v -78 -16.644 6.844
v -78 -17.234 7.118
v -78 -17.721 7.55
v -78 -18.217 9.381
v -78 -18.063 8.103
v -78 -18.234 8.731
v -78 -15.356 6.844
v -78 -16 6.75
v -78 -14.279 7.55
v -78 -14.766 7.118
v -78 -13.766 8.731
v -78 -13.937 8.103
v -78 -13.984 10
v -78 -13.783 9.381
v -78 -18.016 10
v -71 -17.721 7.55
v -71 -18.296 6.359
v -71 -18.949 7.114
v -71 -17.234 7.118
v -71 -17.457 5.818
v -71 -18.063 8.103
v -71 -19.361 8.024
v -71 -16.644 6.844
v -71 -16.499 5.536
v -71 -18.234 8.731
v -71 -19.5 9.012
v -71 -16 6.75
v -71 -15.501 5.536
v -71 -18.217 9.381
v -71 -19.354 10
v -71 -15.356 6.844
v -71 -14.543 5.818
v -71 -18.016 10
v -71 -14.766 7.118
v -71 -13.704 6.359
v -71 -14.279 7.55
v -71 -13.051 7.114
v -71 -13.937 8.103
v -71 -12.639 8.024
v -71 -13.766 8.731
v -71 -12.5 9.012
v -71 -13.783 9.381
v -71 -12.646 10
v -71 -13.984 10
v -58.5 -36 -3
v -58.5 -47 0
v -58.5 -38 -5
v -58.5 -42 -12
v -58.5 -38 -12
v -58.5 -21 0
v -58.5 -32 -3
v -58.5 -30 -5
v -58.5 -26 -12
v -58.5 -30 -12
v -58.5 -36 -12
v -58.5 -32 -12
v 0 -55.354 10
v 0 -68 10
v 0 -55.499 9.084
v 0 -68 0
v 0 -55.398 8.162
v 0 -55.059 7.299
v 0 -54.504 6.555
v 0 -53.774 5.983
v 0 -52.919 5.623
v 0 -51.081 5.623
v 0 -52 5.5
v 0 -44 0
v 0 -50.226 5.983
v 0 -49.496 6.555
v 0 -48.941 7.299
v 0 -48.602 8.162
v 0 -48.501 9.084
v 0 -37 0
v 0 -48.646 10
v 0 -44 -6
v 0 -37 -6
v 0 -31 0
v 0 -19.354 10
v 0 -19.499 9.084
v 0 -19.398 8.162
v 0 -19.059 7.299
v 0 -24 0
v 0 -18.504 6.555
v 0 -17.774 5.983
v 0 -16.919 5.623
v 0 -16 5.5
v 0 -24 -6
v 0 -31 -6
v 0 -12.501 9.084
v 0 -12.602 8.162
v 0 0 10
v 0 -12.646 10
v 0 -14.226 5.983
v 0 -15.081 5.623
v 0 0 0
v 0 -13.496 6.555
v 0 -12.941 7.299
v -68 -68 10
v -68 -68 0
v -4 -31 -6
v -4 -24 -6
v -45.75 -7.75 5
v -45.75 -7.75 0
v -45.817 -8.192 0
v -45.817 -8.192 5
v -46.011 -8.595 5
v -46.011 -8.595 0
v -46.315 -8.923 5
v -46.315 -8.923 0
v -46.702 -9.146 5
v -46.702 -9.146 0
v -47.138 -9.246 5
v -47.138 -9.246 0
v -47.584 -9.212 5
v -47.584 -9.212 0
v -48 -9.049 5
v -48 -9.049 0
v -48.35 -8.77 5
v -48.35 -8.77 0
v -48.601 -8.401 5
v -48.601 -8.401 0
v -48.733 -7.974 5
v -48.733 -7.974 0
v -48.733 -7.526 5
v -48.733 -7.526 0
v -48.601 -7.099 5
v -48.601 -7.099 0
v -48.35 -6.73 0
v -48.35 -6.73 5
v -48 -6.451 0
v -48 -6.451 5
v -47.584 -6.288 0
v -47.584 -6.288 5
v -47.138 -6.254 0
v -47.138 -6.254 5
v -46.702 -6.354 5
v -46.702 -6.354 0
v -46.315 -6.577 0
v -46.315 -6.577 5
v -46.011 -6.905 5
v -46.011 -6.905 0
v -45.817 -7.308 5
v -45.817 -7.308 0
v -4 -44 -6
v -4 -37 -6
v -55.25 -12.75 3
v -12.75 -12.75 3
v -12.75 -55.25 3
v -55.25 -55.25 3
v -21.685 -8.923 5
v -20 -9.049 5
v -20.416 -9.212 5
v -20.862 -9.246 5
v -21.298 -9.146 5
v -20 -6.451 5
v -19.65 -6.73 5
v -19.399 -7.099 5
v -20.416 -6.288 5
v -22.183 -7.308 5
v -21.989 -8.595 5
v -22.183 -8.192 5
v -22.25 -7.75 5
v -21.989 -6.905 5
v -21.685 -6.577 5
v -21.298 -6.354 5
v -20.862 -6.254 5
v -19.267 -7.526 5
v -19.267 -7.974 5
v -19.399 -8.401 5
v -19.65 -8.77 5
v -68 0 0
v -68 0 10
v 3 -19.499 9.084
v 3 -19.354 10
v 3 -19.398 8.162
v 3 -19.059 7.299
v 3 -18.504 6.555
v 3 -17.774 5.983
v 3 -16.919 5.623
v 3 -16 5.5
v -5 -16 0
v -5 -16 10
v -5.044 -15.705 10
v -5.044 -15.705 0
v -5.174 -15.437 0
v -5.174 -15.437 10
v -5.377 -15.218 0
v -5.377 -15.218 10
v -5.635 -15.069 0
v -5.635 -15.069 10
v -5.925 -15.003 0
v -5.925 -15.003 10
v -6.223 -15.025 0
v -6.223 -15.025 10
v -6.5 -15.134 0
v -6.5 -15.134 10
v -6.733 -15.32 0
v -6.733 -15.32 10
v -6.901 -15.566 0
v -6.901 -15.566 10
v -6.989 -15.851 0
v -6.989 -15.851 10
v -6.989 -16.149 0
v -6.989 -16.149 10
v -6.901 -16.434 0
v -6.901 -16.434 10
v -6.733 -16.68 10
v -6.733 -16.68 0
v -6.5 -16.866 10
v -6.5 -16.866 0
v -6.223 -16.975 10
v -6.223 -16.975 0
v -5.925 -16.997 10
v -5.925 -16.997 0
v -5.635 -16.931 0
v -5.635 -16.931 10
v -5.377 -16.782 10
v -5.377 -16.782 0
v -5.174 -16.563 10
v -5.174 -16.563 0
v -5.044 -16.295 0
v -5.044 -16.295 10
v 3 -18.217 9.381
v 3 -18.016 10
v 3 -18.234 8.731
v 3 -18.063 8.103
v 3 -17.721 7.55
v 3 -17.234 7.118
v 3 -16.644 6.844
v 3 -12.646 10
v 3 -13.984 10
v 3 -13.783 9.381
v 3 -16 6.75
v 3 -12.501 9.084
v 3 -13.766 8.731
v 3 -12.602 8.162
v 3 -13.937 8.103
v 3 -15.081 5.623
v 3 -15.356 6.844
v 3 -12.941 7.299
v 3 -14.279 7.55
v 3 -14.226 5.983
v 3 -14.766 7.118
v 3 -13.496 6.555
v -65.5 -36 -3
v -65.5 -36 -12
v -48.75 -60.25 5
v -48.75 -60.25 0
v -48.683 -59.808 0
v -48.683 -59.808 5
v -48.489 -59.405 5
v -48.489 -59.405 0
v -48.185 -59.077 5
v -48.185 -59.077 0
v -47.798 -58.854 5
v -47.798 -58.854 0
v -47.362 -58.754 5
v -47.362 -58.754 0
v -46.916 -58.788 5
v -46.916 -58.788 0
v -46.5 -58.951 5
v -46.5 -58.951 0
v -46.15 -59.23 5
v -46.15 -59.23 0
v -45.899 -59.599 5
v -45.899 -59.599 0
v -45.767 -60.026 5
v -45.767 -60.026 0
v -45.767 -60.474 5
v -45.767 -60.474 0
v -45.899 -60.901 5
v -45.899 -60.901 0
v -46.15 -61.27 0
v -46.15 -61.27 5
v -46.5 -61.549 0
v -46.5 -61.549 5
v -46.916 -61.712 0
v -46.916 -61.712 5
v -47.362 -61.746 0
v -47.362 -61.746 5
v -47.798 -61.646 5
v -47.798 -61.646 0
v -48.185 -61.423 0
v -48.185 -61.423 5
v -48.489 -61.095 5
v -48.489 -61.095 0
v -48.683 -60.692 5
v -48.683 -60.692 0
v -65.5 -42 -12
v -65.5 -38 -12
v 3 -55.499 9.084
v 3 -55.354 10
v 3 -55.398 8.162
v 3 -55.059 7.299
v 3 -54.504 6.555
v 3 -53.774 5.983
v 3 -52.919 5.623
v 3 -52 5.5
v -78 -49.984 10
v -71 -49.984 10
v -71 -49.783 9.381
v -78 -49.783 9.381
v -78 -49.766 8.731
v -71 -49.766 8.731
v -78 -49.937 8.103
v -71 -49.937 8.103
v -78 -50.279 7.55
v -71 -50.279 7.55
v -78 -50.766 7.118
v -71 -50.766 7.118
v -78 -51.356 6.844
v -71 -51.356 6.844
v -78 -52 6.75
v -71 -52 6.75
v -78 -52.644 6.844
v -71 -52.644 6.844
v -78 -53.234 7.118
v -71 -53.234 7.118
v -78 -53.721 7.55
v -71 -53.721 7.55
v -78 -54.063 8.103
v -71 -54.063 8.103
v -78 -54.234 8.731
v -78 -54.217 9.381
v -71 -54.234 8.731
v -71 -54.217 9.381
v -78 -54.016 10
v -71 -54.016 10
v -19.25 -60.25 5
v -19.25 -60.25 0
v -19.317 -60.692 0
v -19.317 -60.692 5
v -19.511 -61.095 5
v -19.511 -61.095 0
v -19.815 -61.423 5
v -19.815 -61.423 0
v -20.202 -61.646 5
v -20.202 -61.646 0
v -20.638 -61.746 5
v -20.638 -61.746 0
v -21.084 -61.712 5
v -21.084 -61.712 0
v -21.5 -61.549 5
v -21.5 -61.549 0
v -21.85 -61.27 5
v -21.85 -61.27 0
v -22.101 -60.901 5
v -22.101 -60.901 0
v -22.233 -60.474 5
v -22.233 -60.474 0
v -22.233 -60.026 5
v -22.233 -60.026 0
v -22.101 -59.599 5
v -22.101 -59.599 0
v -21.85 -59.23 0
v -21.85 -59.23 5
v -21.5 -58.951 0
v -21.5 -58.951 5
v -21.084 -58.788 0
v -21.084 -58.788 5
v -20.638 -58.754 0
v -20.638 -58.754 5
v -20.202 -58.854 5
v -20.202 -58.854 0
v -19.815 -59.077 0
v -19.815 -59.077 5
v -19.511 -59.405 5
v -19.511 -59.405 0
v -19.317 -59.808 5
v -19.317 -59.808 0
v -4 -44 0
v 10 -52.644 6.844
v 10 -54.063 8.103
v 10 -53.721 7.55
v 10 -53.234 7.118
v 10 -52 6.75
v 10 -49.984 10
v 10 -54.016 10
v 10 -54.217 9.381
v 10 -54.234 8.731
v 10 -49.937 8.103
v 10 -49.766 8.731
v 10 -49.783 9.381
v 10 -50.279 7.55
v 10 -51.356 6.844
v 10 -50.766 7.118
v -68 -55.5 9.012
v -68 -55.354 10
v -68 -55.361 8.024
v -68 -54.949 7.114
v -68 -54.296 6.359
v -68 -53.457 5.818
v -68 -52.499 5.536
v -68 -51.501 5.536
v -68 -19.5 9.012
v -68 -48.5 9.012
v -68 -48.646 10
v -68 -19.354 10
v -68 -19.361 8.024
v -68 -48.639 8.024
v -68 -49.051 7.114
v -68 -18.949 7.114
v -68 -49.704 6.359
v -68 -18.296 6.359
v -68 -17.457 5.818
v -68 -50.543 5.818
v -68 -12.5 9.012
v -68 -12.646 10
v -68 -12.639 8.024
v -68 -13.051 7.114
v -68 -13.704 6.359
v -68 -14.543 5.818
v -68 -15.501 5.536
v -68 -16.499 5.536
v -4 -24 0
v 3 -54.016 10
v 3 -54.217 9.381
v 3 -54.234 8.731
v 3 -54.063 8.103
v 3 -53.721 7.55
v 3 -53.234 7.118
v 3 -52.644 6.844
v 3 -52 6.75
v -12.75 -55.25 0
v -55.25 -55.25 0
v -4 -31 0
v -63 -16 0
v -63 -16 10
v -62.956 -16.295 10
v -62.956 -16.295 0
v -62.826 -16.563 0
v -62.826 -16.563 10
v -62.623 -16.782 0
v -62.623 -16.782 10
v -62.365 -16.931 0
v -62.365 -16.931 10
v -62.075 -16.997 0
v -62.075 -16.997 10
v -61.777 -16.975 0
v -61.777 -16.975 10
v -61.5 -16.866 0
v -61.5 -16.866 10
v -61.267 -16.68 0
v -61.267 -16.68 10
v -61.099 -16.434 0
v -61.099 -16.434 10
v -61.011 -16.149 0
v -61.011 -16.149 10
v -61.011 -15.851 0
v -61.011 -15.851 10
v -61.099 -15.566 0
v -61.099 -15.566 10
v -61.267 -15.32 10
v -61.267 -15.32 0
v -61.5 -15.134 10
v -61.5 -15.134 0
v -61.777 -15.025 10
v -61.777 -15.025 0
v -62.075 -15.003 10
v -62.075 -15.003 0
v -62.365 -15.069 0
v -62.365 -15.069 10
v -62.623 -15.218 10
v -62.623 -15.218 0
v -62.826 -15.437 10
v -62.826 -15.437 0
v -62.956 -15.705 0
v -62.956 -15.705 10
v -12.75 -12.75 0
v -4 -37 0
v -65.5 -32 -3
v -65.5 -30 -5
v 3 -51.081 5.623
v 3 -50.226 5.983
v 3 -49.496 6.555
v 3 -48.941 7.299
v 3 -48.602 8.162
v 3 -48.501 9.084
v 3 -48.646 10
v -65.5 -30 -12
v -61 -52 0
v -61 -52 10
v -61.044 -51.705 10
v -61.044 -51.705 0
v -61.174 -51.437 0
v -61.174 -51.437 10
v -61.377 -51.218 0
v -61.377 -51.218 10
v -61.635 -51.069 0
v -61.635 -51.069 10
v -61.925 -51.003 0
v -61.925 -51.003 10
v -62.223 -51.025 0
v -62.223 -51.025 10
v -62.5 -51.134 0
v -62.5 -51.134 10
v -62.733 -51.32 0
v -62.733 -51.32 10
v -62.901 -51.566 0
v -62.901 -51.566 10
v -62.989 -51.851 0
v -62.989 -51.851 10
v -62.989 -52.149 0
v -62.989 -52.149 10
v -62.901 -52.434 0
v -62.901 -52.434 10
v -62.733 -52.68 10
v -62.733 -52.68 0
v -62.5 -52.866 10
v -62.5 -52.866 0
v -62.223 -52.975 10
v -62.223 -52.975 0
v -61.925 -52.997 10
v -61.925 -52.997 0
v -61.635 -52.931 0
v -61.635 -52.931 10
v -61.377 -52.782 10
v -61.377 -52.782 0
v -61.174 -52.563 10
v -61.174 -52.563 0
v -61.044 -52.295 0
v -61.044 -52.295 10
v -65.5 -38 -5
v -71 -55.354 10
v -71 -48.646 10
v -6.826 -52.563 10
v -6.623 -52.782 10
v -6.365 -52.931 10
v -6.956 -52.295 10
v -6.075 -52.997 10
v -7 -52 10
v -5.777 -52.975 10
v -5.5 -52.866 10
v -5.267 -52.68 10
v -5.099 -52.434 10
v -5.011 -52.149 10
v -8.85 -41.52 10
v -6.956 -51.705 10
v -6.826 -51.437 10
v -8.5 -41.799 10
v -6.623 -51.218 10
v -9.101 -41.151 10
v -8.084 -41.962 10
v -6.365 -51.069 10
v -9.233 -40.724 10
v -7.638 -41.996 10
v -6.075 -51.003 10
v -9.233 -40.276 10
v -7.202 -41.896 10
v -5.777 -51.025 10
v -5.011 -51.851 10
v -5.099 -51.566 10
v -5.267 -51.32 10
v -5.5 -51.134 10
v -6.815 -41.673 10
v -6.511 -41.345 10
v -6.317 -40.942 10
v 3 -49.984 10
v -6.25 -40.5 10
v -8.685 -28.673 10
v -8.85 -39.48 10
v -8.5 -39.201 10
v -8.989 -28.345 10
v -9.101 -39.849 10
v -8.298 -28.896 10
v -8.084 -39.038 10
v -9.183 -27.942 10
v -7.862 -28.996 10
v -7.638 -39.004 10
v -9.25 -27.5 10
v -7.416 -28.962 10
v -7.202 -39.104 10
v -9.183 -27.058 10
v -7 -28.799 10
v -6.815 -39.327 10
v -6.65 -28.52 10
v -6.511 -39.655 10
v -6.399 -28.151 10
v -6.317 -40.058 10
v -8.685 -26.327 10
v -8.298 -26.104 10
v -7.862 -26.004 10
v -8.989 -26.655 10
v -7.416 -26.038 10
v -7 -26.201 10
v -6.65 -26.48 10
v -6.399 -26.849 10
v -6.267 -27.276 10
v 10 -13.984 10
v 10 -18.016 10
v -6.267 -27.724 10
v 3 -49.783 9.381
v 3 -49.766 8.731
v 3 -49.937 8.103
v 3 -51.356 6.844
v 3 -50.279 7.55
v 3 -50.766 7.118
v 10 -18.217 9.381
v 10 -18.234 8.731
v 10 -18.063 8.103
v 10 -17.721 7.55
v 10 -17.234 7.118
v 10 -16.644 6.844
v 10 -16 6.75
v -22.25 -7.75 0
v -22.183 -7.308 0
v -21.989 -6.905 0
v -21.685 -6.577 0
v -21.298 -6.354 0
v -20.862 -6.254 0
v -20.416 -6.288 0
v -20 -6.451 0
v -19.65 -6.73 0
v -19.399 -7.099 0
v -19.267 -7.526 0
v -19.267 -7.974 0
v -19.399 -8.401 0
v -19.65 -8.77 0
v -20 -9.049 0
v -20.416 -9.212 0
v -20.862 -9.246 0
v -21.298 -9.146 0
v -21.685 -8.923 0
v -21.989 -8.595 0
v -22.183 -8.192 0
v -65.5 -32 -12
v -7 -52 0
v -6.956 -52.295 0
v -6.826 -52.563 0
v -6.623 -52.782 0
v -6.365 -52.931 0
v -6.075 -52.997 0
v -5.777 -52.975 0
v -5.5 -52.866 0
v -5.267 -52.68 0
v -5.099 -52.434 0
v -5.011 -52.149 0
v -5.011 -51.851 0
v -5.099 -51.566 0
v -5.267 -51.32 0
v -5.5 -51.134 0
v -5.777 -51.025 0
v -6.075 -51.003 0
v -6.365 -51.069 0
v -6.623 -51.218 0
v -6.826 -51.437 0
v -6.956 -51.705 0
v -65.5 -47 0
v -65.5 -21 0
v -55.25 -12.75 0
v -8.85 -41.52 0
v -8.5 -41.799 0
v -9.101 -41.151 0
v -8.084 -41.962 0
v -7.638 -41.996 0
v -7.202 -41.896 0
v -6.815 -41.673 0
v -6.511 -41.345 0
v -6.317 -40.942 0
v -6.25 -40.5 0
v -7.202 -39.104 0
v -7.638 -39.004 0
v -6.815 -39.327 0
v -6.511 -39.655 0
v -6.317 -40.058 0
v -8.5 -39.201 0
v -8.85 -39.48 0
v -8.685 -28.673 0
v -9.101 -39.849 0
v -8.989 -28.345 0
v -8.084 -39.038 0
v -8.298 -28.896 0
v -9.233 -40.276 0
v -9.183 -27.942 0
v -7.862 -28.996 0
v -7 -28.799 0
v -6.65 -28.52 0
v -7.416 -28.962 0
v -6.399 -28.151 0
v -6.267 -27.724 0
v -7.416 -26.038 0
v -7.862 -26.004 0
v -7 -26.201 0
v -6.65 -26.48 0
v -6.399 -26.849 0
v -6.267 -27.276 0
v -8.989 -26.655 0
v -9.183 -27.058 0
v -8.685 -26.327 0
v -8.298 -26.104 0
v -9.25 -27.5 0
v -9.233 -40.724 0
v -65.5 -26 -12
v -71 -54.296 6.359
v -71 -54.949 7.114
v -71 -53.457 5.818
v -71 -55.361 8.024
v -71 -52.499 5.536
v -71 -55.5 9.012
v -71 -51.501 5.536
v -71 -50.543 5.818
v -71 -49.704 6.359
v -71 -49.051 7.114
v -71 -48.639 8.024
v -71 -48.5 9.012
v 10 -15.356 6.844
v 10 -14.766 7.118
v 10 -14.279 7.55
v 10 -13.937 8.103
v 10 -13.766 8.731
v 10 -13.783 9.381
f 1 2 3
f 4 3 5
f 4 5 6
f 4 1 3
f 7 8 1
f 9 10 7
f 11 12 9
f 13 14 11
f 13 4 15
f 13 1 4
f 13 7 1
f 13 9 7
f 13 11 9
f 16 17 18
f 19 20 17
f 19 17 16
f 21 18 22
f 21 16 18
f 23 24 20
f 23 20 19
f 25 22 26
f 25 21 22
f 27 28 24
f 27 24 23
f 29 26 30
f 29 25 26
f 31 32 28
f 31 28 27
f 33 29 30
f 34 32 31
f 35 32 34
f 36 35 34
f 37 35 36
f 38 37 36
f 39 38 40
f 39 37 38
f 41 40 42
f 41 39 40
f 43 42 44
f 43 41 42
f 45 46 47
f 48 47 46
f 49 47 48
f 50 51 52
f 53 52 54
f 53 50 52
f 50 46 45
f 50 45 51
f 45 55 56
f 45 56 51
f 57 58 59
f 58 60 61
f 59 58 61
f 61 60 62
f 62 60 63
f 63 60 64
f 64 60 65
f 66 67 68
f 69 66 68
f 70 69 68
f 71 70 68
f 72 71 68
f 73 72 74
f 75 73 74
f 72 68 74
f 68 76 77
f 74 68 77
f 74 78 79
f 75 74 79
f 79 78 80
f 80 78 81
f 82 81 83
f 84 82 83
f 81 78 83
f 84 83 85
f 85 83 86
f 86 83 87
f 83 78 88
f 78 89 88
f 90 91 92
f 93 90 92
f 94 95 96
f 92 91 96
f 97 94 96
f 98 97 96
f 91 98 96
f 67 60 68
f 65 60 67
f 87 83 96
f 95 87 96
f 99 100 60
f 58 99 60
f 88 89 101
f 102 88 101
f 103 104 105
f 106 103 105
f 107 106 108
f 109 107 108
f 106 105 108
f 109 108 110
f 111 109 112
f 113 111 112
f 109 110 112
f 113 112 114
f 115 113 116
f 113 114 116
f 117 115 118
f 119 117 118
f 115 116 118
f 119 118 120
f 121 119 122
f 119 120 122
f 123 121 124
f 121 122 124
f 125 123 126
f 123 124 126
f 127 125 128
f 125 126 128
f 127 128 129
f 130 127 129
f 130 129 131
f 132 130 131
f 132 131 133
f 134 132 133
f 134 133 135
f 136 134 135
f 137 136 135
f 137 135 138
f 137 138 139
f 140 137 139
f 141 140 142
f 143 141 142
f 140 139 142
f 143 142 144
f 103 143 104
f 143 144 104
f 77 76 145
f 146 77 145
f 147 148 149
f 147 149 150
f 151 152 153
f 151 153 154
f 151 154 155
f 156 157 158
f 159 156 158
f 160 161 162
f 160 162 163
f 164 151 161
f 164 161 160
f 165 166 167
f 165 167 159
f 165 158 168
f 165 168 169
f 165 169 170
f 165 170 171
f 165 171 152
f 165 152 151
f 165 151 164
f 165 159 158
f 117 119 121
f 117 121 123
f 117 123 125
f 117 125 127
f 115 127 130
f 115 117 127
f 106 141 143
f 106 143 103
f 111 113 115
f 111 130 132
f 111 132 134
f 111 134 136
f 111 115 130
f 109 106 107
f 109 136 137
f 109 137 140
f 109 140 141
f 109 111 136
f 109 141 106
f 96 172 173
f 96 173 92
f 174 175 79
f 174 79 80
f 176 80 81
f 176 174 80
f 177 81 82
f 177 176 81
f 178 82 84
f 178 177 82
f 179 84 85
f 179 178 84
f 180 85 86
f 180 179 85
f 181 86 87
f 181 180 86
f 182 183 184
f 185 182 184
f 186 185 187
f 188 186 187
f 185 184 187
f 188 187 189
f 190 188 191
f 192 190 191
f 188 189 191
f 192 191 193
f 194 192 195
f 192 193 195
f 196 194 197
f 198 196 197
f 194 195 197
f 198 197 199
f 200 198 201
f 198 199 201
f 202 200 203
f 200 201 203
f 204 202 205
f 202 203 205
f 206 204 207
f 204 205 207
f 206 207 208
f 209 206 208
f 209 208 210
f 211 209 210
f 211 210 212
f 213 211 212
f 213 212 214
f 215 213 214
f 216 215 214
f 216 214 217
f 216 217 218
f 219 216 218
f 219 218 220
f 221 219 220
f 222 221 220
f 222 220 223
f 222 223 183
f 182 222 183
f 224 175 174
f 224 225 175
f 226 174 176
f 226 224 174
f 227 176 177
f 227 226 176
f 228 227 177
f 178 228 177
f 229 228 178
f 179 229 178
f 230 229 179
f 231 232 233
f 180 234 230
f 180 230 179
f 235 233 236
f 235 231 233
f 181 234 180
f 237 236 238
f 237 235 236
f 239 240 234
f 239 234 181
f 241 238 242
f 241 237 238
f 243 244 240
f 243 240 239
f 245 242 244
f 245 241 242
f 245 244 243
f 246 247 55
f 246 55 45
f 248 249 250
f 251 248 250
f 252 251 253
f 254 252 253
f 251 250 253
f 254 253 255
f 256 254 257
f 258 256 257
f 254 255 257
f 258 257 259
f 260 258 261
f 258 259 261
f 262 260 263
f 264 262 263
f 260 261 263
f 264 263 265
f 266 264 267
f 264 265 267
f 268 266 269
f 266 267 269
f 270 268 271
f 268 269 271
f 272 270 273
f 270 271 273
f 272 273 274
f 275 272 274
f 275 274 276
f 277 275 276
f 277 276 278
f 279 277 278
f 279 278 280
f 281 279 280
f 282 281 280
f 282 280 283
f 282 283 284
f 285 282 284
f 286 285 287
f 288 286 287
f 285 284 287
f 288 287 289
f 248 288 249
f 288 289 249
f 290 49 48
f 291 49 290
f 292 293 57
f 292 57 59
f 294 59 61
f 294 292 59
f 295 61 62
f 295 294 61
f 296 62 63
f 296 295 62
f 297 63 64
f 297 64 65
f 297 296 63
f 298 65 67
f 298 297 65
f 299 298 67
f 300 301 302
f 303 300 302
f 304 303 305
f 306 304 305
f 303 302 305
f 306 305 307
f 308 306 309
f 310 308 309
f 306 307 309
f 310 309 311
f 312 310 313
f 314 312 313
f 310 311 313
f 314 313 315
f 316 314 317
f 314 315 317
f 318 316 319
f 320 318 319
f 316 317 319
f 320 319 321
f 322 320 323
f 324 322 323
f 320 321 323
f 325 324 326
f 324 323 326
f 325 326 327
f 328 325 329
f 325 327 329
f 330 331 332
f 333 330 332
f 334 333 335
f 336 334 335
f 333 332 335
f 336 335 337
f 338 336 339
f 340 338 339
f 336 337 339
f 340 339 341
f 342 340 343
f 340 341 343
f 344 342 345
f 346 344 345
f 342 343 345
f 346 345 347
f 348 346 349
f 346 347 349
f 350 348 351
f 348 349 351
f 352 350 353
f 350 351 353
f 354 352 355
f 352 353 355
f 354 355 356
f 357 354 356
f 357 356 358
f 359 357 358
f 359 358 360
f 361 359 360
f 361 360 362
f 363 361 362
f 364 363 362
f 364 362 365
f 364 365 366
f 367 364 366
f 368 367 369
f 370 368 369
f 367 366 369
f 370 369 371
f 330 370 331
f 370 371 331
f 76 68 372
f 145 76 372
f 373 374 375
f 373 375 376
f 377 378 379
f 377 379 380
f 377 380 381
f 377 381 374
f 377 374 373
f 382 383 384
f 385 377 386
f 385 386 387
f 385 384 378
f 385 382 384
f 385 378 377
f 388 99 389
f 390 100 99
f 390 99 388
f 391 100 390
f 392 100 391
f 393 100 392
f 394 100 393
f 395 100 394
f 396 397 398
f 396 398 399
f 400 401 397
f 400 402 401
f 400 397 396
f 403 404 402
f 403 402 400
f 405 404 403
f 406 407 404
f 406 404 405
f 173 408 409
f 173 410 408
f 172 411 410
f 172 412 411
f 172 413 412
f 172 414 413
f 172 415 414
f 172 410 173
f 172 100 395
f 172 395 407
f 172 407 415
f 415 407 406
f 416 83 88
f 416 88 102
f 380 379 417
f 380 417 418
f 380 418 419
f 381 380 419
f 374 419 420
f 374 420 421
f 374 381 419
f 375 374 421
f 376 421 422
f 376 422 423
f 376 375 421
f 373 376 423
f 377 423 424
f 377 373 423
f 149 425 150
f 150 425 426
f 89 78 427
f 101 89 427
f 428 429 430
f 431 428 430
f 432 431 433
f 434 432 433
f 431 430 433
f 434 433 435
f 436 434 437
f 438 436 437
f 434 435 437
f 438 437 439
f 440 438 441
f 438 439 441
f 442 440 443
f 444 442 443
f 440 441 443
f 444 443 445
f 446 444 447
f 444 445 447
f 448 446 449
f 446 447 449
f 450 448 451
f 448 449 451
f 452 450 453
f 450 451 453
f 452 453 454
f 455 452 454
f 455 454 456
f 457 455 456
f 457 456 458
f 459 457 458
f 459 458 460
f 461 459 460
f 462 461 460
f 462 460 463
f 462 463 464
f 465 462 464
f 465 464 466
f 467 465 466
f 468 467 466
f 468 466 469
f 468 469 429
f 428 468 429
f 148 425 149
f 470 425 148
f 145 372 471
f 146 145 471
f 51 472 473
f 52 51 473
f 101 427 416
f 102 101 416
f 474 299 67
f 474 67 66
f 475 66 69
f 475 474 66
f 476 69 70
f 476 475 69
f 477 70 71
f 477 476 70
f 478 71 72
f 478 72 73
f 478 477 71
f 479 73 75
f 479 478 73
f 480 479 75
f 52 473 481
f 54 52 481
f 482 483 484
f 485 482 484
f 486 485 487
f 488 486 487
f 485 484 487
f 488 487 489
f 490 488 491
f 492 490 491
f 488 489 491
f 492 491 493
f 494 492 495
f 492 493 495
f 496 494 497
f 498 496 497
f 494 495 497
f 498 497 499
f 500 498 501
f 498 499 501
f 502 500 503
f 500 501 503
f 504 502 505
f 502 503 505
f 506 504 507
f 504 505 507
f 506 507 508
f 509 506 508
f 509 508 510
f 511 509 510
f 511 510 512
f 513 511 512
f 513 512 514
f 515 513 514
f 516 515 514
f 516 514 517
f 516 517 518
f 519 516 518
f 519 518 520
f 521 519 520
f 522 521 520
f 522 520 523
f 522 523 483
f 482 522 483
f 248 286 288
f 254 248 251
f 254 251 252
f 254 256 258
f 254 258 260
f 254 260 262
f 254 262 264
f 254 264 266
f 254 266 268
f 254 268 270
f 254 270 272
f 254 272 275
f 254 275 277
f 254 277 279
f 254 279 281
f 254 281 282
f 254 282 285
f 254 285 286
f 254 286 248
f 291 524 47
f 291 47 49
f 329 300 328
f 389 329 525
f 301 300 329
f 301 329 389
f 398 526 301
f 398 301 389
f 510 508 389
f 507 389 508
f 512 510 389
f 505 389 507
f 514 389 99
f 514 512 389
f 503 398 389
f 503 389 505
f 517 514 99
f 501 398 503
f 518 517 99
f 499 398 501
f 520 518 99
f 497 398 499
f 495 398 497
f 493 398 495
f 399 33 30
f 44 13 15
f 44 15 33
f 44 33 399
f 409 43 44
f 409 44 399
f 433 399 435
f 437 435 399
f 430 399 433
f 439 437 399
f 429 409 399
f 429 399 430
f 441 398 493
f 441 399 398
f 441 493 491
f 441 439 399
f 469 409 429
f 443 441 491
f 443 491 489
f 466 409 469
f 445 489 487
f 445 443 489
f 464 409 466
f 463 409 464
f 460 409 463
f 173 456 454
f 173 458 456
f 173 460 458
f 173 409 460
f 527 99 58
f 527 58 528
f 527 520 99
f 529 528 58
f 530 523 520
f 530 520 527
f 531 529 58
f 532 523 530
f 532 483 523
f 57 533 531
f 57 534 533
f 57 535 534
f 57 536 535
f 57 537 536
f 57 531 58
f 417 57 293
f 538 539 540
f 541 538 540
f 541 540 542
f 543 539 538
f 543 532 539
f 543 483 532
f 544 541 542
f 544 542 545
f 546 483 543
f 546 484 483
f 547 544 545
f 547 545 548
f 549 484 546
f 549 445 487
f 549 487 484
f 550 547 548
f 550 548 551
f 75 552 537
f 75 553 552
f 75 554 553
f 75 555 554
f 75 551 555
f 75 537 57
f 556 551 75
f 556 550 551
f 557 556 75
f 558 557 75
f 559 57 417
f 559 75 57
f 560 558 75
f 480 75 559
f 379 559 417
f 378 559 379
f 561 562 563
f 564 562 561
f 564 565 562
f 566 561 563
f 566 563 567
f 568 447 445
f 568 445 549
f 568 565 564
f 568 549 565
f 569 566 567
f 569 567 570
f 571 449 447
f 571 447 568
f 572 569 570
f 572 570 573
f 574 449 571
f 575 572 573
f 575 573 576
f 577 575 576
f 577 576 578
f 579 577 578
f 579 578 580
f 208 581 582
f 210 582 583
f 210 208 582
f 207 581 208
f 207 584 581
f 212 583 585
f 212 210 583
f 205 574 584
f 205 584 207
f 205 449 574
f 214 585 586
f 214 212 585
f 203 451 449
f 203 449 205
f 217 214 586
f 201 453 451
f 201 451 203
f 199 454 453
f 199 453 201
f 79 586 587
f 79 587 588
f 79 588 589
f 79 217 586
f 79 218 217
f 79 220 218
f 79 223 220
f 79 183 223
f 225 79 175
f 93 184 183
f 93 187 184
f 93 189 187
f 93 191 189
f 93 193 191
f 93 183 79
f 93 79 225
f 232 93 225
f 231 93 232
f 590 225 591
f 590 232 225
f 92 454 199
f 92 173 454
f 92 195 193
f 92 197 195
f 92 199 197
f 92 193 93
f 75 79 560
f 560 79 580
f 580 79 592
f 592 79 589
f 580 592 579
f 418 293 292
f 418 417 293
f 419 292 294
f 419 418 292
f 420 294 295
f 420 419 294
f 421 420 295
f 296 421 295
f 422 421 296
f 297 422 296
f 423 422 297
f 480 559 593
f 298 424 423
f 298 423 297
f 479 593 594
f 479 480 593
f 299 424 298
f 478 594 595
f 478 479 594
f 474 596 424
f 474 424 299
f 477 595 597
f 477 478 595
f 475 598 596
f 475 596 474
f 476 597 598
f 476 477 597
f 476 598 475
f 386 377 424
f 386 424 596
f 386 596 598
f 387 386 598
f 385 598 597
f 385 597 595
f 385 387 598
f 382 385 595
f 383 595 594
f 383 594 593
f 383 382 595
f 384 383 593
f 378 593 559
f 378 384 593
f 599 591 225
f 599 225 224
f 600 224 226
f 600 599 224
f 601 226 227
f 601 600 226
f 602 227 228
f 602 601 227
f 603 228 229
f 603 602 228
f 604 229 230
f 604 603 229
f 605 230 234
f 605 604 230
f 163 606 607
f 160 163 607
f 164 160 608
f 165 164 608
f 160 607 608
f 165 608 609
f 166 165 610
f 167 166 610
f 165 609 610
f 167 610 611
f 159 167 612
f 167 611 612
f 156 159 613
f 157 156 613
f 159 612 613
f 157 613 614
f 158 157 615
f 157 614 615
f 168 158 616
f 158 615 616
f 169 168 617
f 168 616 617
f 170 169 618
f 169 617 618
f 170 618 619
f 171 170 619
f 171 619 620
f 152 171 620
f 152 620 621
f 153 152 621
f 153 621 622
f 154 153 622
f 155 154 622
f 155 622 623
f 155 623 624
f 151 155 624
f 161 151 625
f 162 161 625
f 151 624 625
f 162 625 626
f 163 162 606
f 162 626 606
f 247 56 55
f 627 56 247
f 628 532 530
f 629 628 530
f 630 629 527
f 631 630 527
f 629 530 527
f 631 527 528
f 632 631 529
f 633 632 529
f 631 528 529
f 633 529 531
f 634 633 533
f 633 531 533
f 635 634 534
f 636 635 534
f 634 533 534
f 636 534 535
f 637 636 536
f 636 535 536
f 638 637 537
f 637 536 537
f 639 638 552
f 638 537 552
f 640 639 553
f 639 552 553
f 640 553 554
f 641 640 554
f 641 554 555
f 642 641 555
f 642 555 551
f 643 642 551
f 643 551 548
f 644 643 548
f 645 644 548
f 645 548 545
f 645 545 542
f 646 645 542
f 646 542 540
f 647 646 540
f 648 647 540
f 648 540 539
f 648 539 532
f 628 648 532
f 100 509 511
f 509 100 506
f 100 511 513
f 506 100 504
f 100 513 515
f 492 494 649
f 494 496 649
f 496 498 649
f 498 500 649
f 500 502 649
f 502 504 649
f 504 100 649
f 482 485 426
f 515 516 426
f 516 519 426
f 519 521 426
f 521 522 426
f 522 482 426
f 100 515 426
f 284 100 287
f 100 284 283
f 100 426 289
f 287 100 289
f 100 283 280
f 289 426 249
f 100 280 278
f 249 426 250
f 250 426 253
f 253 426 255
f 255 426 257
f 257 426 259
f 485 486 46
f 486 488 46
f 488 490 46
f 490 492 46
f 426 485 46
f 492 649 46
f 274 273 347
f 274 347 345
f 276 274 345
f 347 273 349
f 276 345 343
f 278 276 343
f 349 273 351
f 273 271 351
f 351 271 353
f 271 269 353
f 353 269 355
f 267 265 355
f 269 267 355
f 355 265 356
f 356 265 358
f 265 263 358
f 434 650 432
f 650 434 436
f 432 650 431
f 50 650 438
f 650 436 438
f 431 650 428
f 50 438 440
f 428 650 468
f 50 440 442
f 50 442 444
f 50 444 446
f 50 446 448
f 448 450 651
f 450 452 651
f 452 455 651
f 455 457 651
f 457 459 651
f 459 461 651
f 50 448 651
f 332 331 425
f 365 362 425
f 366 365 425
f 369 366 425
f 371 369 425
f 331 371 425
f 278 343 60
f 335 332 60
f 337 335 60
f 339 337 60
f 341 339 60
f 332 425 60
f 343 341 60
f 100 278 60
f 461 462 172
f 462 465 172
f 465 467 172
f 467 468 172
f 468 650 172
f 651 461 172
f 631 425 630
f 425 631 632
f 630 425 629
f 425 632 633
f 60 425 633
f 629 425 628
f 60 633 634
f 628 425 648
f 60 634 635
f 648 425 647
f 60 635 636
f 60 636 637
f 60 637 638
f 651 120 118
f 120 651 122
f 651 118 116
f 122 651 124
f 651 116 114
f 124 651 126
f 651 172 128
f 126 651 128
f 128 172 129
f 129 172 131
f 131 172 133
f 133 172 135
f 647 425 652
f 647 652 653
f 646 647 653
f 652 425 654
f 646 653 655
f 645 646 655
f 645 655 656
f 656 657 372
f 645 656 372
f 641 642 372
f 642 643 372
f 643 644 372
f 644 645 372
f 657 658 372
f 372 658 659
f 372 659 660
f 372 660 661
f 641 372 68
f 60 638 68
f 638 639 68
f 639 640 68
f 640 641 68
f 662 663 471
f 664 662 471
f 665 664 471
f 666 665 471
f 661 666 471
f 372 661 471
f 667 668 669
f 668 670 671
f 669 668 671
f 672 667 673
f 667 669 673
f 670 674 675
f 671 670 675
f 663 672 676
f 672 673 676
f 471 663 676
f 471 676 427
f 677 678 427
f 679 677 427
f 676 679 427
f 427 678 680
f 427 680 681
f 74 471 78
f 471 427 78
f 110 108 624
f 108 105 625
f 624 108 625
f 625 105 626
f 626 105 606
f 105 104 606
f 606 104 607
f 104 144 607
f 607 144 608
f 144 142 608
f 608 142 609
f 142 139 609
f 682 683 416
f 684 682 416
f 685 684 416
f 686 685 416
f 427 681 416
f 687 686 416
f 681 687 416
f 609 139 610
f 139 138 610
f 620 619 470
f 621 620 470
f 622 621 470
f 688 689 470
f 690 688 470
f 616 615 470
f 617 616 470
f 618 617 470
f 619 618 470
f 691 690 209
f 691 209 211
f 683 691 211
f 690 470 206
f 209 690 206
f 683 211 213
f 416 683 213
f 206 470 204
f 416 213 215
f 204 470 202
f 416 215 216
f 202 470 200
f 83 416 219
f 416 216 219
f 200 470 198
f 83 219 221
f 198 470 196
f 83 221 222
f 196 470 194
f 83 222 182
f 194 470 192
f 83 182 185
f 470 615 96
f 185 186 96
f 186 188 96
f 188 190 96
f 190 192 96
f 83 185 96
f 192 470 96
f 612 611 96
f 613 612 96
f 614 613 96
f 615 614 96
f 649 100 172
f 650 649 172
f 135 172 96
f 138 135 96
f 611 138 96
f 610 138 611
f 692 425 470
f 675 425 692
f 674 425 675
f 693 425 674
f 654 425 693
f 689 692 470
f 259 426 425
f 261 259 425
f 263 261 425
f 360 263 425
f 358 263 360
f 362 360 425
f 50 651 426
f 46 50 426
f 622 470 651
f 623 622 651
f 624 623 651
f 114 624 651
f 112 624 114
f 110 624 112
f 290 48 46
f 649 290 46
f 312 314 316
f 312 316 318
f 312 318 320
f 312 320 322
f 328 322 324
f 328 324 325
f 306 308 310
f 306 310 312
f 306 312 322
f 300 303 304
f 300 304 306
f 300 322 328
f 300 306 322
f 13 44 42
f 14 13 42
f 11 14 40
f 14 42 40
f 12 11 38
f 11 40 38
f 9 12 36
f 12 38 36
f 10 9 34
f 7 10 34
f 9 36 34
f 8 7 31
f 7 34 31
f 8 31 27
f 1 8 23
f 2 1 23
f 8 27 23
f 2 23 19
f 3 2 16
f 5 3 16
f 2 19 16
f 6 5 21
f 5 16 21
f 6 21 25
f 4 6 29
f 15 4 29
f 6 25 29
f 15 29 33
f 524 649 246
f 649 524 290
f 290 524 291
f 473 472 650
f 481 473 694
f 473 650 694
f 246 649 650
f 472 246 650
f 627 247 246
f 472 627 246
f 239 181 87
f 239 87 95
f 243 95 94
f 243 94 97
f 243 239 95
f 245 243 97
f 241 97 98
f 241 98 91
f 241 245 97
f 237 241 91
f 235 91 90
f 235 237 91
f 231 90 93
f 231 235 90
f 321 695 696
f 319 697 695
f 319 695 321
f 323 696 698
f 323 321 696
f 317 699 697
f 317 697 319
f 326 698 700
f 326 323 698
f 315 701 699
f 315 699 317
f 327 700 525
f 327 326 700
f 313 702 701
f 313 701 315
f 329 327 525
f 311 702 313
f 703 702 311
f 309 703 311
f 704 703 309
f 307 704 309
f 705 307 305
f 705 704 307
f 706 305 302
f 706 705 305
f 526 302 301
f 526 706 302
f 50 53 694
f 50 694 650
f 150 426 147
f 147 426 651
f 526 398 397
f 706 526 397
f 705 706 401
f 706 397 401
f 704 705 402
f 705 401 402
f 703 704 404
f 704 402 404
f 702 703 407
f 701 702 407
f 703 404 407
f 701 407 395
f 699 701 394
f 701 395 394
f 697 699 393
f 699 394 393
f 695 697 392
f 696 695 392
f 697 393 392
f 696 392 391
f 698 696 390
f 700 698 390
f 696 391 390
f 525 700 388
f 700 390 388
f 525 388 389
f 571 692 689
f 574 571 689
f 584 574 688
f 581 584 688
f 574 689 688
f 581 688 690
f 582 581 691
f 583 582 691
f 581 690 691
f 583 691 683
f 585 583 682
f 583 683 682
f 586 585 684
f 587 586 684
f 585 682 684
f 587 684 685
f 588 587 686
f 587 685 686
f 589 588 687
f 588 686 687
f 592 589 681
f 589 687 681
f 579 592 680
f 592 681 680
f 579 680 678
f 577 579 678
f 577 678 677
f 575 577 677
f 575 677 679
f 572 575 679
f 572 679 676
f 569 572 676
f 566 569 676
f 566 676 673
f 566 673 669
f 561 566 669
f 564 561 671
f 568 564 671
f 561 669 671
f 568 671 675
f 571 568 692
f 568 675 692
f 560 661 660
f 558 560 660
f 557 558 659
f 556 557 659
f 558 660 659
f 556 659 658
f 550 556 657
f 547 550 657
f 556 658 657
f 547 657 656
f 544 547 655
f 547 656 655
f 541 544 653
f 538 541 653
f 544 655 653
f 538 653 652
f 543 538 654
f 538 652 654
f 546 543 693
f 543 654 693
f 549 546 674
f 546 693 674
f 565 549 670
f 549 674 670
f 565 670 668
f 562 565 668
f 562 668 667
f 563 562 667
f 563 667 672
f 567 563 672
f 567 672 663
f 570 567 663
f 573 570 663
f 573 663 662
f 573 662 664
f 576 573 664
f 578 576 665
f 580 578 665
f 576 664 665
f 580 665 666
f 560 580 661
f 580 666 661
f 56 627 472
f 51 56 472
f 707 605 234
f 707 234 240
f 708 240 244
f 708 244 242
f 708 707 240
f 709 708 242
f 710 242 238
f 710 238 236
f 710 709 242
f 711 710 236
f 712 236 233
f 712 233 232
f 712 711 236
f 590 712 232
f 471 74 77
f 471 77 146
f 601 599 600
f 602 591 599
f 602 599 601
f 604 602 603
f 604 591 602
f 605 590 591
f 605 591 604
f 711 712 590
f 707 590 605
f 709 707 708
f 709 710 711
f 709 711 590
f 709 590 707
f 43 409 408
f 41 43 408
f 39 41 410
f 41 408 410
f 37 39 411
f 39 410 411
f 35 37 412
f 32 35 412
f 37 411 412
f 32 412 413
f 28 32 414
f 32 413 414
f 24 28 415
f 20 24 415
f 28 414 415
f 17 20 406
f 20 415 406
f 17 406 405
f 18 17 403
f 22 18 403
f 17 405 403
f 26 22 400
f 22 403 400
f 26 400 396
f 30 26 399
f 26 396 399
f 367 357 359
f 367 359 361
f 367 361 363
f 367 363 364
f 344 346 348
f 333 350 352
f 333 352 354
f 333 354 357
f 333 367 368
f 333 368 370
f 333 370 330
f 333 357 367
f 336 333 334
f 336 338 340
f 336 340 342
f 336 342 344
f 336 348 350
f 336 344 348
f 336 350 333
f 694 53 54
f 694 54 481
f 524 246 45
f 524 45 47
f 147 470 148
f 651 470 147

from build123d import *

# Parameters (mm, degrees)
SKETCH1_W           = 68
SKETCH1_H           = 68
BOSS_EXTRUDE1_DEPTH = 10
BOSS_EXTRUDE2_DEPTH = 3
BOSS_EXTRUDE3_DEPTH = 7
BOSS_EXTRUDE4_START = 3
BOSS_EXTRUDE4_DEPTH = 3
BOSS_EXTRUDE5_START = 7
BOSS_EXTRUDE5_DEPTH = 7
SKETCH6_W           = 42.5
SKETCH6_H           = 42.5
CUT_EXTRUDE1_DEPTH  = 3
SKETCH8_R           = 1.5
CUT_EXTRUDE2_DEPTH  = 5
SKETCH9_W           = 4
SKETCH9_H           = 7
BOSS_EXTRUDE6_DEPTH = 6
SKETCH10_R          = 1.5
CUT_EXTRUDE3_DEPTH  = 10
SKETCH11_R          = 1
CUT_EXTRUDE4_DEPTH  = 20
SKETCH13_W          = 7
SKETCH13_H          = 16
BOSS_EXTRUDE7_DEPTH = 12
CUT_EXTRUDE5_DEPTH  = 10
BOSS_EXTRUDE8_START = -7
BOSS_EXTRUDE8_DEPTH = 7


with BuildPart() as part:
    # Sketch1 → Boss-Extrude1 (new body)
    with BuildSketch(Plane.XY):
        with Locations((-34, -34)):
            Rectangle(SKETCH1_W, SKETCH1_H)
    extrude(amount=BOSS_EXTRUDE1_DEPTH)

    # Sketch2 → Boss-Extrude2 (add)
    with BuildSketch(Plane.ZY.offset(68)):
        with BuildLine():
            Line((10, -19.354101966), (10, -12.645898034))
            ThreePointArc((10, -12.645898034), (5.5, -16), (10, -19.354101966))
        make_face()
        with BuildLine():
            Line((10, -55.354101966), (10, -48.645898034))
            ThreePointArc((10, -48.645898034), (5.5, -52), (10, -55.354101966))
        make_face()
    extrude(amount=BOSS_EXTRUDE2_DEPTH)

    # Sketch3 → Boss-Extrude3 (add)
    with BuildSketch(Plane.ZY.offset(71)):
        with BuildLine():
            ThreePointArc((10, -49.984435563), (6.75, -52), (10, -54.015564437))
            Line((10, -54.015564437), (10, -49.984435563))
        make_face()
        with BuildLine():
            ThreePointArc((10, -13.984435563), (6.75, -16), (10, -18.015564437))
            Line((10, -18.015564437), (10, -13.984435563))
        make_face()
    extrude(amount=BOSS_EXTRUDE3_DEPTH)

    # Sketch4 → Boss-Extrude4 (add)
    with BuildSketch(Plane(origin=(0, 0, 0), x_dir=(0, 0, -1), z_dir=(1, 0, 0)).offset(BOSS_EXTRUDE4_START)):
        with BuildLine():
            ThreePointArc((-5.5, -16), (-6.908349934, -13.19375696), (-10, -12.645898034))
            Line((-10, -12.645898034), (-10, -19.354101966))
            ThreePointArc((-10, -19.354101966), (-6.908349934, -18.80624304), (-5.5, -16))
        make_face()
        with BuildLine():
            ThreePointArc((-5.5, -52), (-6.908349934, -49.19375696), (-10, -48.645898034))
            Line((-10, -48.645898034), (-10, -55.354101966))
            ThreePointArc((-10, -55.354101966), (-6.908349934, -54.80624304), (-5.5, -52))
        make_face()
    extrude(amount=-BOSS_EXTRUDE4_DEPTH)

    # Sketch5 → Boss-Extrude5 (add)
    with BuildSketch(Plane(origin=(3, 0, 0), x_dir=(0, 0, -1), z_dir=(1, 0, 0)).offset(BOSS_EXTRUDE5_START)):
        with BuildLine():
            ThreePointArc((-6.75, -16), (-7.814145877, -14.087867682), (-10, -13.984435563))
            Line((-10, -13.984435563), (-10, -18.015564437))
            ThreePointArc((-10, -18.015564437), (-7.814145877, -17.912132318), (-6.75, -16))
        make_face()
        with BuildLine():
            ThreePointArc((-6.75, -52), (-7.814145877, -50.087867682), (-10, -49.984435563))
            Line((-10, -49.984435563), (-10, -54.015564437))
            ThreePointArc((-10, -54.015564437), (-7.814145877, -53.912132318), (-6.75, -52))
        make_face()
    extrude(amount=-BOSS_EXTRUDE5_DEPTH)

    # Sketch6 → Cut-Extrude1 (cut)
    with BuildSketch(Plane(origin=(0, 0, 0), x_dir=(-1, 0, 0), z_dir=(0, 0, -1))):
        with Locations((34, -34)):
            Rectangle(SKETCH6_W, SKETCH6_H)
    extrude(amount=-CUT_EXTRUDE1_DEPTH, mode=Mode.SUBTRACT)

    # Sketch8 → Cut-Extrude2 (cut)
    with BuildSketch(Plane(origin=(0, 0, 0), x_dir=(-1, 0, 0), z_dir=(0, 0, -1))):
        with Locations((20.75, -7.75)):
            Circle(SKETCH8_R)
        with Locations(Location((47.25, -7.75, 0), (0, 0, 180))):
            Circle(SKETCH8_R)
        with Locations((47.25, -60.25)):
            Circle(SKETCH8_R)
        with Locations(Location((20.75, -60.25, 0), (0, 0, 180))):
            Circle(SKETCH8_R)
    extrude(amount=-CUT_EXTRUDE2_DEPTH, mode=Mode.SUBTRACT)

    # Sketch9 → Boss-Extrude6 (add)
    with BuildSketch(Plane(origin=(0, 0, 0), x_dir=(-1, 0, 0), z_dir=(0, 0, -1))):
        with Locations((2, -27.5)):
            Rectangle(SKETCH9_W, SKETCH9_H)
        with Locations((2, -40.5)):
            Rectangle(SKETCH9_W, SKETCH9_H)
    extrude(amount=BOSS_EXTRUDE6_DEPTH)

    # Sketch10 → Cut-Extrude3 (cut)
    with BuildSketch(Plane(origin=(0, 0, 0), x_dir=(-1, 0, 0), z_dir=(0, 0, -1))):
        with Locations((7.75, -27.5)):
            Circle(SKETCH10_R)
        with Locations(Location((7.75, -40.5, 0), (0, 0, 180))):
            Circle(SKETCH10_R)
    extrude(amount=-CUT_EXTRUDE3_DEPTH, mode=Mode.SUBTRACT)

    # Sketch11 → Cut-Extrude4 (cut)
    with BuildSketch(Plane.XY.offset(10)):
        with Locations((-62, -52)):
            Circle(SKETCH11_R)
        with Locations(Location((-62, -16, 0), (0, 0, 180))):
            Circle(SKETCH11_R)
        with Locations(Location((-6, -52, 0), (0, 0, 180))):
            Circle(SKETCH11_R)
        with Locations((-6, -16)):
            Circle(SKETCH11_R)
    extrude(amount=-CUT_EXTRUDE4_DEPTH, mode=Mode.SUBTRACT)

    # Sketch13 → Boss-Extrude7 (add)
    with BuildSketch(Plane(origin=(0, 0, 0), x_dir=(-1, 0, 0), z_dir=(0, 0, -1))):
        with Locations((62, -34)):
            Rectangle(SKETCH13_W, SKETCH13_H)
    extrude(amount=BOSS_EXTRUDE7_DEPTH)

    # Sketch15 → Cut-Extrude5 (cut)
    with BuildSketch(Plane.ZY.offset(65.5)):
        Polygon((-12, -32), (-3, -32), (-5, -30), (-12, -30), align=None)
        Polygon((-12, -38), (-12, -36), (-3, -36), (-5, -38), align=None)
    extrude(amount=-CUT_EXTRUDE5_DEPTH, mode=Mode.SUBTRACT)

    # Sketch16 → Boss-Extrude8 (add)
    with BuildSketch(Plane.ZY.offset(65.5).offset(BOSS_EXTRUDE8_START)):
        Polygon((0, -26), (-12, -26), (0, -21), align=None)
        Polygon((-12, -42), (0, -47), (0, -42), align=None)
    extrude(amount=BOSS_EXTRUDE8_DEPTH)


solid = part.part
